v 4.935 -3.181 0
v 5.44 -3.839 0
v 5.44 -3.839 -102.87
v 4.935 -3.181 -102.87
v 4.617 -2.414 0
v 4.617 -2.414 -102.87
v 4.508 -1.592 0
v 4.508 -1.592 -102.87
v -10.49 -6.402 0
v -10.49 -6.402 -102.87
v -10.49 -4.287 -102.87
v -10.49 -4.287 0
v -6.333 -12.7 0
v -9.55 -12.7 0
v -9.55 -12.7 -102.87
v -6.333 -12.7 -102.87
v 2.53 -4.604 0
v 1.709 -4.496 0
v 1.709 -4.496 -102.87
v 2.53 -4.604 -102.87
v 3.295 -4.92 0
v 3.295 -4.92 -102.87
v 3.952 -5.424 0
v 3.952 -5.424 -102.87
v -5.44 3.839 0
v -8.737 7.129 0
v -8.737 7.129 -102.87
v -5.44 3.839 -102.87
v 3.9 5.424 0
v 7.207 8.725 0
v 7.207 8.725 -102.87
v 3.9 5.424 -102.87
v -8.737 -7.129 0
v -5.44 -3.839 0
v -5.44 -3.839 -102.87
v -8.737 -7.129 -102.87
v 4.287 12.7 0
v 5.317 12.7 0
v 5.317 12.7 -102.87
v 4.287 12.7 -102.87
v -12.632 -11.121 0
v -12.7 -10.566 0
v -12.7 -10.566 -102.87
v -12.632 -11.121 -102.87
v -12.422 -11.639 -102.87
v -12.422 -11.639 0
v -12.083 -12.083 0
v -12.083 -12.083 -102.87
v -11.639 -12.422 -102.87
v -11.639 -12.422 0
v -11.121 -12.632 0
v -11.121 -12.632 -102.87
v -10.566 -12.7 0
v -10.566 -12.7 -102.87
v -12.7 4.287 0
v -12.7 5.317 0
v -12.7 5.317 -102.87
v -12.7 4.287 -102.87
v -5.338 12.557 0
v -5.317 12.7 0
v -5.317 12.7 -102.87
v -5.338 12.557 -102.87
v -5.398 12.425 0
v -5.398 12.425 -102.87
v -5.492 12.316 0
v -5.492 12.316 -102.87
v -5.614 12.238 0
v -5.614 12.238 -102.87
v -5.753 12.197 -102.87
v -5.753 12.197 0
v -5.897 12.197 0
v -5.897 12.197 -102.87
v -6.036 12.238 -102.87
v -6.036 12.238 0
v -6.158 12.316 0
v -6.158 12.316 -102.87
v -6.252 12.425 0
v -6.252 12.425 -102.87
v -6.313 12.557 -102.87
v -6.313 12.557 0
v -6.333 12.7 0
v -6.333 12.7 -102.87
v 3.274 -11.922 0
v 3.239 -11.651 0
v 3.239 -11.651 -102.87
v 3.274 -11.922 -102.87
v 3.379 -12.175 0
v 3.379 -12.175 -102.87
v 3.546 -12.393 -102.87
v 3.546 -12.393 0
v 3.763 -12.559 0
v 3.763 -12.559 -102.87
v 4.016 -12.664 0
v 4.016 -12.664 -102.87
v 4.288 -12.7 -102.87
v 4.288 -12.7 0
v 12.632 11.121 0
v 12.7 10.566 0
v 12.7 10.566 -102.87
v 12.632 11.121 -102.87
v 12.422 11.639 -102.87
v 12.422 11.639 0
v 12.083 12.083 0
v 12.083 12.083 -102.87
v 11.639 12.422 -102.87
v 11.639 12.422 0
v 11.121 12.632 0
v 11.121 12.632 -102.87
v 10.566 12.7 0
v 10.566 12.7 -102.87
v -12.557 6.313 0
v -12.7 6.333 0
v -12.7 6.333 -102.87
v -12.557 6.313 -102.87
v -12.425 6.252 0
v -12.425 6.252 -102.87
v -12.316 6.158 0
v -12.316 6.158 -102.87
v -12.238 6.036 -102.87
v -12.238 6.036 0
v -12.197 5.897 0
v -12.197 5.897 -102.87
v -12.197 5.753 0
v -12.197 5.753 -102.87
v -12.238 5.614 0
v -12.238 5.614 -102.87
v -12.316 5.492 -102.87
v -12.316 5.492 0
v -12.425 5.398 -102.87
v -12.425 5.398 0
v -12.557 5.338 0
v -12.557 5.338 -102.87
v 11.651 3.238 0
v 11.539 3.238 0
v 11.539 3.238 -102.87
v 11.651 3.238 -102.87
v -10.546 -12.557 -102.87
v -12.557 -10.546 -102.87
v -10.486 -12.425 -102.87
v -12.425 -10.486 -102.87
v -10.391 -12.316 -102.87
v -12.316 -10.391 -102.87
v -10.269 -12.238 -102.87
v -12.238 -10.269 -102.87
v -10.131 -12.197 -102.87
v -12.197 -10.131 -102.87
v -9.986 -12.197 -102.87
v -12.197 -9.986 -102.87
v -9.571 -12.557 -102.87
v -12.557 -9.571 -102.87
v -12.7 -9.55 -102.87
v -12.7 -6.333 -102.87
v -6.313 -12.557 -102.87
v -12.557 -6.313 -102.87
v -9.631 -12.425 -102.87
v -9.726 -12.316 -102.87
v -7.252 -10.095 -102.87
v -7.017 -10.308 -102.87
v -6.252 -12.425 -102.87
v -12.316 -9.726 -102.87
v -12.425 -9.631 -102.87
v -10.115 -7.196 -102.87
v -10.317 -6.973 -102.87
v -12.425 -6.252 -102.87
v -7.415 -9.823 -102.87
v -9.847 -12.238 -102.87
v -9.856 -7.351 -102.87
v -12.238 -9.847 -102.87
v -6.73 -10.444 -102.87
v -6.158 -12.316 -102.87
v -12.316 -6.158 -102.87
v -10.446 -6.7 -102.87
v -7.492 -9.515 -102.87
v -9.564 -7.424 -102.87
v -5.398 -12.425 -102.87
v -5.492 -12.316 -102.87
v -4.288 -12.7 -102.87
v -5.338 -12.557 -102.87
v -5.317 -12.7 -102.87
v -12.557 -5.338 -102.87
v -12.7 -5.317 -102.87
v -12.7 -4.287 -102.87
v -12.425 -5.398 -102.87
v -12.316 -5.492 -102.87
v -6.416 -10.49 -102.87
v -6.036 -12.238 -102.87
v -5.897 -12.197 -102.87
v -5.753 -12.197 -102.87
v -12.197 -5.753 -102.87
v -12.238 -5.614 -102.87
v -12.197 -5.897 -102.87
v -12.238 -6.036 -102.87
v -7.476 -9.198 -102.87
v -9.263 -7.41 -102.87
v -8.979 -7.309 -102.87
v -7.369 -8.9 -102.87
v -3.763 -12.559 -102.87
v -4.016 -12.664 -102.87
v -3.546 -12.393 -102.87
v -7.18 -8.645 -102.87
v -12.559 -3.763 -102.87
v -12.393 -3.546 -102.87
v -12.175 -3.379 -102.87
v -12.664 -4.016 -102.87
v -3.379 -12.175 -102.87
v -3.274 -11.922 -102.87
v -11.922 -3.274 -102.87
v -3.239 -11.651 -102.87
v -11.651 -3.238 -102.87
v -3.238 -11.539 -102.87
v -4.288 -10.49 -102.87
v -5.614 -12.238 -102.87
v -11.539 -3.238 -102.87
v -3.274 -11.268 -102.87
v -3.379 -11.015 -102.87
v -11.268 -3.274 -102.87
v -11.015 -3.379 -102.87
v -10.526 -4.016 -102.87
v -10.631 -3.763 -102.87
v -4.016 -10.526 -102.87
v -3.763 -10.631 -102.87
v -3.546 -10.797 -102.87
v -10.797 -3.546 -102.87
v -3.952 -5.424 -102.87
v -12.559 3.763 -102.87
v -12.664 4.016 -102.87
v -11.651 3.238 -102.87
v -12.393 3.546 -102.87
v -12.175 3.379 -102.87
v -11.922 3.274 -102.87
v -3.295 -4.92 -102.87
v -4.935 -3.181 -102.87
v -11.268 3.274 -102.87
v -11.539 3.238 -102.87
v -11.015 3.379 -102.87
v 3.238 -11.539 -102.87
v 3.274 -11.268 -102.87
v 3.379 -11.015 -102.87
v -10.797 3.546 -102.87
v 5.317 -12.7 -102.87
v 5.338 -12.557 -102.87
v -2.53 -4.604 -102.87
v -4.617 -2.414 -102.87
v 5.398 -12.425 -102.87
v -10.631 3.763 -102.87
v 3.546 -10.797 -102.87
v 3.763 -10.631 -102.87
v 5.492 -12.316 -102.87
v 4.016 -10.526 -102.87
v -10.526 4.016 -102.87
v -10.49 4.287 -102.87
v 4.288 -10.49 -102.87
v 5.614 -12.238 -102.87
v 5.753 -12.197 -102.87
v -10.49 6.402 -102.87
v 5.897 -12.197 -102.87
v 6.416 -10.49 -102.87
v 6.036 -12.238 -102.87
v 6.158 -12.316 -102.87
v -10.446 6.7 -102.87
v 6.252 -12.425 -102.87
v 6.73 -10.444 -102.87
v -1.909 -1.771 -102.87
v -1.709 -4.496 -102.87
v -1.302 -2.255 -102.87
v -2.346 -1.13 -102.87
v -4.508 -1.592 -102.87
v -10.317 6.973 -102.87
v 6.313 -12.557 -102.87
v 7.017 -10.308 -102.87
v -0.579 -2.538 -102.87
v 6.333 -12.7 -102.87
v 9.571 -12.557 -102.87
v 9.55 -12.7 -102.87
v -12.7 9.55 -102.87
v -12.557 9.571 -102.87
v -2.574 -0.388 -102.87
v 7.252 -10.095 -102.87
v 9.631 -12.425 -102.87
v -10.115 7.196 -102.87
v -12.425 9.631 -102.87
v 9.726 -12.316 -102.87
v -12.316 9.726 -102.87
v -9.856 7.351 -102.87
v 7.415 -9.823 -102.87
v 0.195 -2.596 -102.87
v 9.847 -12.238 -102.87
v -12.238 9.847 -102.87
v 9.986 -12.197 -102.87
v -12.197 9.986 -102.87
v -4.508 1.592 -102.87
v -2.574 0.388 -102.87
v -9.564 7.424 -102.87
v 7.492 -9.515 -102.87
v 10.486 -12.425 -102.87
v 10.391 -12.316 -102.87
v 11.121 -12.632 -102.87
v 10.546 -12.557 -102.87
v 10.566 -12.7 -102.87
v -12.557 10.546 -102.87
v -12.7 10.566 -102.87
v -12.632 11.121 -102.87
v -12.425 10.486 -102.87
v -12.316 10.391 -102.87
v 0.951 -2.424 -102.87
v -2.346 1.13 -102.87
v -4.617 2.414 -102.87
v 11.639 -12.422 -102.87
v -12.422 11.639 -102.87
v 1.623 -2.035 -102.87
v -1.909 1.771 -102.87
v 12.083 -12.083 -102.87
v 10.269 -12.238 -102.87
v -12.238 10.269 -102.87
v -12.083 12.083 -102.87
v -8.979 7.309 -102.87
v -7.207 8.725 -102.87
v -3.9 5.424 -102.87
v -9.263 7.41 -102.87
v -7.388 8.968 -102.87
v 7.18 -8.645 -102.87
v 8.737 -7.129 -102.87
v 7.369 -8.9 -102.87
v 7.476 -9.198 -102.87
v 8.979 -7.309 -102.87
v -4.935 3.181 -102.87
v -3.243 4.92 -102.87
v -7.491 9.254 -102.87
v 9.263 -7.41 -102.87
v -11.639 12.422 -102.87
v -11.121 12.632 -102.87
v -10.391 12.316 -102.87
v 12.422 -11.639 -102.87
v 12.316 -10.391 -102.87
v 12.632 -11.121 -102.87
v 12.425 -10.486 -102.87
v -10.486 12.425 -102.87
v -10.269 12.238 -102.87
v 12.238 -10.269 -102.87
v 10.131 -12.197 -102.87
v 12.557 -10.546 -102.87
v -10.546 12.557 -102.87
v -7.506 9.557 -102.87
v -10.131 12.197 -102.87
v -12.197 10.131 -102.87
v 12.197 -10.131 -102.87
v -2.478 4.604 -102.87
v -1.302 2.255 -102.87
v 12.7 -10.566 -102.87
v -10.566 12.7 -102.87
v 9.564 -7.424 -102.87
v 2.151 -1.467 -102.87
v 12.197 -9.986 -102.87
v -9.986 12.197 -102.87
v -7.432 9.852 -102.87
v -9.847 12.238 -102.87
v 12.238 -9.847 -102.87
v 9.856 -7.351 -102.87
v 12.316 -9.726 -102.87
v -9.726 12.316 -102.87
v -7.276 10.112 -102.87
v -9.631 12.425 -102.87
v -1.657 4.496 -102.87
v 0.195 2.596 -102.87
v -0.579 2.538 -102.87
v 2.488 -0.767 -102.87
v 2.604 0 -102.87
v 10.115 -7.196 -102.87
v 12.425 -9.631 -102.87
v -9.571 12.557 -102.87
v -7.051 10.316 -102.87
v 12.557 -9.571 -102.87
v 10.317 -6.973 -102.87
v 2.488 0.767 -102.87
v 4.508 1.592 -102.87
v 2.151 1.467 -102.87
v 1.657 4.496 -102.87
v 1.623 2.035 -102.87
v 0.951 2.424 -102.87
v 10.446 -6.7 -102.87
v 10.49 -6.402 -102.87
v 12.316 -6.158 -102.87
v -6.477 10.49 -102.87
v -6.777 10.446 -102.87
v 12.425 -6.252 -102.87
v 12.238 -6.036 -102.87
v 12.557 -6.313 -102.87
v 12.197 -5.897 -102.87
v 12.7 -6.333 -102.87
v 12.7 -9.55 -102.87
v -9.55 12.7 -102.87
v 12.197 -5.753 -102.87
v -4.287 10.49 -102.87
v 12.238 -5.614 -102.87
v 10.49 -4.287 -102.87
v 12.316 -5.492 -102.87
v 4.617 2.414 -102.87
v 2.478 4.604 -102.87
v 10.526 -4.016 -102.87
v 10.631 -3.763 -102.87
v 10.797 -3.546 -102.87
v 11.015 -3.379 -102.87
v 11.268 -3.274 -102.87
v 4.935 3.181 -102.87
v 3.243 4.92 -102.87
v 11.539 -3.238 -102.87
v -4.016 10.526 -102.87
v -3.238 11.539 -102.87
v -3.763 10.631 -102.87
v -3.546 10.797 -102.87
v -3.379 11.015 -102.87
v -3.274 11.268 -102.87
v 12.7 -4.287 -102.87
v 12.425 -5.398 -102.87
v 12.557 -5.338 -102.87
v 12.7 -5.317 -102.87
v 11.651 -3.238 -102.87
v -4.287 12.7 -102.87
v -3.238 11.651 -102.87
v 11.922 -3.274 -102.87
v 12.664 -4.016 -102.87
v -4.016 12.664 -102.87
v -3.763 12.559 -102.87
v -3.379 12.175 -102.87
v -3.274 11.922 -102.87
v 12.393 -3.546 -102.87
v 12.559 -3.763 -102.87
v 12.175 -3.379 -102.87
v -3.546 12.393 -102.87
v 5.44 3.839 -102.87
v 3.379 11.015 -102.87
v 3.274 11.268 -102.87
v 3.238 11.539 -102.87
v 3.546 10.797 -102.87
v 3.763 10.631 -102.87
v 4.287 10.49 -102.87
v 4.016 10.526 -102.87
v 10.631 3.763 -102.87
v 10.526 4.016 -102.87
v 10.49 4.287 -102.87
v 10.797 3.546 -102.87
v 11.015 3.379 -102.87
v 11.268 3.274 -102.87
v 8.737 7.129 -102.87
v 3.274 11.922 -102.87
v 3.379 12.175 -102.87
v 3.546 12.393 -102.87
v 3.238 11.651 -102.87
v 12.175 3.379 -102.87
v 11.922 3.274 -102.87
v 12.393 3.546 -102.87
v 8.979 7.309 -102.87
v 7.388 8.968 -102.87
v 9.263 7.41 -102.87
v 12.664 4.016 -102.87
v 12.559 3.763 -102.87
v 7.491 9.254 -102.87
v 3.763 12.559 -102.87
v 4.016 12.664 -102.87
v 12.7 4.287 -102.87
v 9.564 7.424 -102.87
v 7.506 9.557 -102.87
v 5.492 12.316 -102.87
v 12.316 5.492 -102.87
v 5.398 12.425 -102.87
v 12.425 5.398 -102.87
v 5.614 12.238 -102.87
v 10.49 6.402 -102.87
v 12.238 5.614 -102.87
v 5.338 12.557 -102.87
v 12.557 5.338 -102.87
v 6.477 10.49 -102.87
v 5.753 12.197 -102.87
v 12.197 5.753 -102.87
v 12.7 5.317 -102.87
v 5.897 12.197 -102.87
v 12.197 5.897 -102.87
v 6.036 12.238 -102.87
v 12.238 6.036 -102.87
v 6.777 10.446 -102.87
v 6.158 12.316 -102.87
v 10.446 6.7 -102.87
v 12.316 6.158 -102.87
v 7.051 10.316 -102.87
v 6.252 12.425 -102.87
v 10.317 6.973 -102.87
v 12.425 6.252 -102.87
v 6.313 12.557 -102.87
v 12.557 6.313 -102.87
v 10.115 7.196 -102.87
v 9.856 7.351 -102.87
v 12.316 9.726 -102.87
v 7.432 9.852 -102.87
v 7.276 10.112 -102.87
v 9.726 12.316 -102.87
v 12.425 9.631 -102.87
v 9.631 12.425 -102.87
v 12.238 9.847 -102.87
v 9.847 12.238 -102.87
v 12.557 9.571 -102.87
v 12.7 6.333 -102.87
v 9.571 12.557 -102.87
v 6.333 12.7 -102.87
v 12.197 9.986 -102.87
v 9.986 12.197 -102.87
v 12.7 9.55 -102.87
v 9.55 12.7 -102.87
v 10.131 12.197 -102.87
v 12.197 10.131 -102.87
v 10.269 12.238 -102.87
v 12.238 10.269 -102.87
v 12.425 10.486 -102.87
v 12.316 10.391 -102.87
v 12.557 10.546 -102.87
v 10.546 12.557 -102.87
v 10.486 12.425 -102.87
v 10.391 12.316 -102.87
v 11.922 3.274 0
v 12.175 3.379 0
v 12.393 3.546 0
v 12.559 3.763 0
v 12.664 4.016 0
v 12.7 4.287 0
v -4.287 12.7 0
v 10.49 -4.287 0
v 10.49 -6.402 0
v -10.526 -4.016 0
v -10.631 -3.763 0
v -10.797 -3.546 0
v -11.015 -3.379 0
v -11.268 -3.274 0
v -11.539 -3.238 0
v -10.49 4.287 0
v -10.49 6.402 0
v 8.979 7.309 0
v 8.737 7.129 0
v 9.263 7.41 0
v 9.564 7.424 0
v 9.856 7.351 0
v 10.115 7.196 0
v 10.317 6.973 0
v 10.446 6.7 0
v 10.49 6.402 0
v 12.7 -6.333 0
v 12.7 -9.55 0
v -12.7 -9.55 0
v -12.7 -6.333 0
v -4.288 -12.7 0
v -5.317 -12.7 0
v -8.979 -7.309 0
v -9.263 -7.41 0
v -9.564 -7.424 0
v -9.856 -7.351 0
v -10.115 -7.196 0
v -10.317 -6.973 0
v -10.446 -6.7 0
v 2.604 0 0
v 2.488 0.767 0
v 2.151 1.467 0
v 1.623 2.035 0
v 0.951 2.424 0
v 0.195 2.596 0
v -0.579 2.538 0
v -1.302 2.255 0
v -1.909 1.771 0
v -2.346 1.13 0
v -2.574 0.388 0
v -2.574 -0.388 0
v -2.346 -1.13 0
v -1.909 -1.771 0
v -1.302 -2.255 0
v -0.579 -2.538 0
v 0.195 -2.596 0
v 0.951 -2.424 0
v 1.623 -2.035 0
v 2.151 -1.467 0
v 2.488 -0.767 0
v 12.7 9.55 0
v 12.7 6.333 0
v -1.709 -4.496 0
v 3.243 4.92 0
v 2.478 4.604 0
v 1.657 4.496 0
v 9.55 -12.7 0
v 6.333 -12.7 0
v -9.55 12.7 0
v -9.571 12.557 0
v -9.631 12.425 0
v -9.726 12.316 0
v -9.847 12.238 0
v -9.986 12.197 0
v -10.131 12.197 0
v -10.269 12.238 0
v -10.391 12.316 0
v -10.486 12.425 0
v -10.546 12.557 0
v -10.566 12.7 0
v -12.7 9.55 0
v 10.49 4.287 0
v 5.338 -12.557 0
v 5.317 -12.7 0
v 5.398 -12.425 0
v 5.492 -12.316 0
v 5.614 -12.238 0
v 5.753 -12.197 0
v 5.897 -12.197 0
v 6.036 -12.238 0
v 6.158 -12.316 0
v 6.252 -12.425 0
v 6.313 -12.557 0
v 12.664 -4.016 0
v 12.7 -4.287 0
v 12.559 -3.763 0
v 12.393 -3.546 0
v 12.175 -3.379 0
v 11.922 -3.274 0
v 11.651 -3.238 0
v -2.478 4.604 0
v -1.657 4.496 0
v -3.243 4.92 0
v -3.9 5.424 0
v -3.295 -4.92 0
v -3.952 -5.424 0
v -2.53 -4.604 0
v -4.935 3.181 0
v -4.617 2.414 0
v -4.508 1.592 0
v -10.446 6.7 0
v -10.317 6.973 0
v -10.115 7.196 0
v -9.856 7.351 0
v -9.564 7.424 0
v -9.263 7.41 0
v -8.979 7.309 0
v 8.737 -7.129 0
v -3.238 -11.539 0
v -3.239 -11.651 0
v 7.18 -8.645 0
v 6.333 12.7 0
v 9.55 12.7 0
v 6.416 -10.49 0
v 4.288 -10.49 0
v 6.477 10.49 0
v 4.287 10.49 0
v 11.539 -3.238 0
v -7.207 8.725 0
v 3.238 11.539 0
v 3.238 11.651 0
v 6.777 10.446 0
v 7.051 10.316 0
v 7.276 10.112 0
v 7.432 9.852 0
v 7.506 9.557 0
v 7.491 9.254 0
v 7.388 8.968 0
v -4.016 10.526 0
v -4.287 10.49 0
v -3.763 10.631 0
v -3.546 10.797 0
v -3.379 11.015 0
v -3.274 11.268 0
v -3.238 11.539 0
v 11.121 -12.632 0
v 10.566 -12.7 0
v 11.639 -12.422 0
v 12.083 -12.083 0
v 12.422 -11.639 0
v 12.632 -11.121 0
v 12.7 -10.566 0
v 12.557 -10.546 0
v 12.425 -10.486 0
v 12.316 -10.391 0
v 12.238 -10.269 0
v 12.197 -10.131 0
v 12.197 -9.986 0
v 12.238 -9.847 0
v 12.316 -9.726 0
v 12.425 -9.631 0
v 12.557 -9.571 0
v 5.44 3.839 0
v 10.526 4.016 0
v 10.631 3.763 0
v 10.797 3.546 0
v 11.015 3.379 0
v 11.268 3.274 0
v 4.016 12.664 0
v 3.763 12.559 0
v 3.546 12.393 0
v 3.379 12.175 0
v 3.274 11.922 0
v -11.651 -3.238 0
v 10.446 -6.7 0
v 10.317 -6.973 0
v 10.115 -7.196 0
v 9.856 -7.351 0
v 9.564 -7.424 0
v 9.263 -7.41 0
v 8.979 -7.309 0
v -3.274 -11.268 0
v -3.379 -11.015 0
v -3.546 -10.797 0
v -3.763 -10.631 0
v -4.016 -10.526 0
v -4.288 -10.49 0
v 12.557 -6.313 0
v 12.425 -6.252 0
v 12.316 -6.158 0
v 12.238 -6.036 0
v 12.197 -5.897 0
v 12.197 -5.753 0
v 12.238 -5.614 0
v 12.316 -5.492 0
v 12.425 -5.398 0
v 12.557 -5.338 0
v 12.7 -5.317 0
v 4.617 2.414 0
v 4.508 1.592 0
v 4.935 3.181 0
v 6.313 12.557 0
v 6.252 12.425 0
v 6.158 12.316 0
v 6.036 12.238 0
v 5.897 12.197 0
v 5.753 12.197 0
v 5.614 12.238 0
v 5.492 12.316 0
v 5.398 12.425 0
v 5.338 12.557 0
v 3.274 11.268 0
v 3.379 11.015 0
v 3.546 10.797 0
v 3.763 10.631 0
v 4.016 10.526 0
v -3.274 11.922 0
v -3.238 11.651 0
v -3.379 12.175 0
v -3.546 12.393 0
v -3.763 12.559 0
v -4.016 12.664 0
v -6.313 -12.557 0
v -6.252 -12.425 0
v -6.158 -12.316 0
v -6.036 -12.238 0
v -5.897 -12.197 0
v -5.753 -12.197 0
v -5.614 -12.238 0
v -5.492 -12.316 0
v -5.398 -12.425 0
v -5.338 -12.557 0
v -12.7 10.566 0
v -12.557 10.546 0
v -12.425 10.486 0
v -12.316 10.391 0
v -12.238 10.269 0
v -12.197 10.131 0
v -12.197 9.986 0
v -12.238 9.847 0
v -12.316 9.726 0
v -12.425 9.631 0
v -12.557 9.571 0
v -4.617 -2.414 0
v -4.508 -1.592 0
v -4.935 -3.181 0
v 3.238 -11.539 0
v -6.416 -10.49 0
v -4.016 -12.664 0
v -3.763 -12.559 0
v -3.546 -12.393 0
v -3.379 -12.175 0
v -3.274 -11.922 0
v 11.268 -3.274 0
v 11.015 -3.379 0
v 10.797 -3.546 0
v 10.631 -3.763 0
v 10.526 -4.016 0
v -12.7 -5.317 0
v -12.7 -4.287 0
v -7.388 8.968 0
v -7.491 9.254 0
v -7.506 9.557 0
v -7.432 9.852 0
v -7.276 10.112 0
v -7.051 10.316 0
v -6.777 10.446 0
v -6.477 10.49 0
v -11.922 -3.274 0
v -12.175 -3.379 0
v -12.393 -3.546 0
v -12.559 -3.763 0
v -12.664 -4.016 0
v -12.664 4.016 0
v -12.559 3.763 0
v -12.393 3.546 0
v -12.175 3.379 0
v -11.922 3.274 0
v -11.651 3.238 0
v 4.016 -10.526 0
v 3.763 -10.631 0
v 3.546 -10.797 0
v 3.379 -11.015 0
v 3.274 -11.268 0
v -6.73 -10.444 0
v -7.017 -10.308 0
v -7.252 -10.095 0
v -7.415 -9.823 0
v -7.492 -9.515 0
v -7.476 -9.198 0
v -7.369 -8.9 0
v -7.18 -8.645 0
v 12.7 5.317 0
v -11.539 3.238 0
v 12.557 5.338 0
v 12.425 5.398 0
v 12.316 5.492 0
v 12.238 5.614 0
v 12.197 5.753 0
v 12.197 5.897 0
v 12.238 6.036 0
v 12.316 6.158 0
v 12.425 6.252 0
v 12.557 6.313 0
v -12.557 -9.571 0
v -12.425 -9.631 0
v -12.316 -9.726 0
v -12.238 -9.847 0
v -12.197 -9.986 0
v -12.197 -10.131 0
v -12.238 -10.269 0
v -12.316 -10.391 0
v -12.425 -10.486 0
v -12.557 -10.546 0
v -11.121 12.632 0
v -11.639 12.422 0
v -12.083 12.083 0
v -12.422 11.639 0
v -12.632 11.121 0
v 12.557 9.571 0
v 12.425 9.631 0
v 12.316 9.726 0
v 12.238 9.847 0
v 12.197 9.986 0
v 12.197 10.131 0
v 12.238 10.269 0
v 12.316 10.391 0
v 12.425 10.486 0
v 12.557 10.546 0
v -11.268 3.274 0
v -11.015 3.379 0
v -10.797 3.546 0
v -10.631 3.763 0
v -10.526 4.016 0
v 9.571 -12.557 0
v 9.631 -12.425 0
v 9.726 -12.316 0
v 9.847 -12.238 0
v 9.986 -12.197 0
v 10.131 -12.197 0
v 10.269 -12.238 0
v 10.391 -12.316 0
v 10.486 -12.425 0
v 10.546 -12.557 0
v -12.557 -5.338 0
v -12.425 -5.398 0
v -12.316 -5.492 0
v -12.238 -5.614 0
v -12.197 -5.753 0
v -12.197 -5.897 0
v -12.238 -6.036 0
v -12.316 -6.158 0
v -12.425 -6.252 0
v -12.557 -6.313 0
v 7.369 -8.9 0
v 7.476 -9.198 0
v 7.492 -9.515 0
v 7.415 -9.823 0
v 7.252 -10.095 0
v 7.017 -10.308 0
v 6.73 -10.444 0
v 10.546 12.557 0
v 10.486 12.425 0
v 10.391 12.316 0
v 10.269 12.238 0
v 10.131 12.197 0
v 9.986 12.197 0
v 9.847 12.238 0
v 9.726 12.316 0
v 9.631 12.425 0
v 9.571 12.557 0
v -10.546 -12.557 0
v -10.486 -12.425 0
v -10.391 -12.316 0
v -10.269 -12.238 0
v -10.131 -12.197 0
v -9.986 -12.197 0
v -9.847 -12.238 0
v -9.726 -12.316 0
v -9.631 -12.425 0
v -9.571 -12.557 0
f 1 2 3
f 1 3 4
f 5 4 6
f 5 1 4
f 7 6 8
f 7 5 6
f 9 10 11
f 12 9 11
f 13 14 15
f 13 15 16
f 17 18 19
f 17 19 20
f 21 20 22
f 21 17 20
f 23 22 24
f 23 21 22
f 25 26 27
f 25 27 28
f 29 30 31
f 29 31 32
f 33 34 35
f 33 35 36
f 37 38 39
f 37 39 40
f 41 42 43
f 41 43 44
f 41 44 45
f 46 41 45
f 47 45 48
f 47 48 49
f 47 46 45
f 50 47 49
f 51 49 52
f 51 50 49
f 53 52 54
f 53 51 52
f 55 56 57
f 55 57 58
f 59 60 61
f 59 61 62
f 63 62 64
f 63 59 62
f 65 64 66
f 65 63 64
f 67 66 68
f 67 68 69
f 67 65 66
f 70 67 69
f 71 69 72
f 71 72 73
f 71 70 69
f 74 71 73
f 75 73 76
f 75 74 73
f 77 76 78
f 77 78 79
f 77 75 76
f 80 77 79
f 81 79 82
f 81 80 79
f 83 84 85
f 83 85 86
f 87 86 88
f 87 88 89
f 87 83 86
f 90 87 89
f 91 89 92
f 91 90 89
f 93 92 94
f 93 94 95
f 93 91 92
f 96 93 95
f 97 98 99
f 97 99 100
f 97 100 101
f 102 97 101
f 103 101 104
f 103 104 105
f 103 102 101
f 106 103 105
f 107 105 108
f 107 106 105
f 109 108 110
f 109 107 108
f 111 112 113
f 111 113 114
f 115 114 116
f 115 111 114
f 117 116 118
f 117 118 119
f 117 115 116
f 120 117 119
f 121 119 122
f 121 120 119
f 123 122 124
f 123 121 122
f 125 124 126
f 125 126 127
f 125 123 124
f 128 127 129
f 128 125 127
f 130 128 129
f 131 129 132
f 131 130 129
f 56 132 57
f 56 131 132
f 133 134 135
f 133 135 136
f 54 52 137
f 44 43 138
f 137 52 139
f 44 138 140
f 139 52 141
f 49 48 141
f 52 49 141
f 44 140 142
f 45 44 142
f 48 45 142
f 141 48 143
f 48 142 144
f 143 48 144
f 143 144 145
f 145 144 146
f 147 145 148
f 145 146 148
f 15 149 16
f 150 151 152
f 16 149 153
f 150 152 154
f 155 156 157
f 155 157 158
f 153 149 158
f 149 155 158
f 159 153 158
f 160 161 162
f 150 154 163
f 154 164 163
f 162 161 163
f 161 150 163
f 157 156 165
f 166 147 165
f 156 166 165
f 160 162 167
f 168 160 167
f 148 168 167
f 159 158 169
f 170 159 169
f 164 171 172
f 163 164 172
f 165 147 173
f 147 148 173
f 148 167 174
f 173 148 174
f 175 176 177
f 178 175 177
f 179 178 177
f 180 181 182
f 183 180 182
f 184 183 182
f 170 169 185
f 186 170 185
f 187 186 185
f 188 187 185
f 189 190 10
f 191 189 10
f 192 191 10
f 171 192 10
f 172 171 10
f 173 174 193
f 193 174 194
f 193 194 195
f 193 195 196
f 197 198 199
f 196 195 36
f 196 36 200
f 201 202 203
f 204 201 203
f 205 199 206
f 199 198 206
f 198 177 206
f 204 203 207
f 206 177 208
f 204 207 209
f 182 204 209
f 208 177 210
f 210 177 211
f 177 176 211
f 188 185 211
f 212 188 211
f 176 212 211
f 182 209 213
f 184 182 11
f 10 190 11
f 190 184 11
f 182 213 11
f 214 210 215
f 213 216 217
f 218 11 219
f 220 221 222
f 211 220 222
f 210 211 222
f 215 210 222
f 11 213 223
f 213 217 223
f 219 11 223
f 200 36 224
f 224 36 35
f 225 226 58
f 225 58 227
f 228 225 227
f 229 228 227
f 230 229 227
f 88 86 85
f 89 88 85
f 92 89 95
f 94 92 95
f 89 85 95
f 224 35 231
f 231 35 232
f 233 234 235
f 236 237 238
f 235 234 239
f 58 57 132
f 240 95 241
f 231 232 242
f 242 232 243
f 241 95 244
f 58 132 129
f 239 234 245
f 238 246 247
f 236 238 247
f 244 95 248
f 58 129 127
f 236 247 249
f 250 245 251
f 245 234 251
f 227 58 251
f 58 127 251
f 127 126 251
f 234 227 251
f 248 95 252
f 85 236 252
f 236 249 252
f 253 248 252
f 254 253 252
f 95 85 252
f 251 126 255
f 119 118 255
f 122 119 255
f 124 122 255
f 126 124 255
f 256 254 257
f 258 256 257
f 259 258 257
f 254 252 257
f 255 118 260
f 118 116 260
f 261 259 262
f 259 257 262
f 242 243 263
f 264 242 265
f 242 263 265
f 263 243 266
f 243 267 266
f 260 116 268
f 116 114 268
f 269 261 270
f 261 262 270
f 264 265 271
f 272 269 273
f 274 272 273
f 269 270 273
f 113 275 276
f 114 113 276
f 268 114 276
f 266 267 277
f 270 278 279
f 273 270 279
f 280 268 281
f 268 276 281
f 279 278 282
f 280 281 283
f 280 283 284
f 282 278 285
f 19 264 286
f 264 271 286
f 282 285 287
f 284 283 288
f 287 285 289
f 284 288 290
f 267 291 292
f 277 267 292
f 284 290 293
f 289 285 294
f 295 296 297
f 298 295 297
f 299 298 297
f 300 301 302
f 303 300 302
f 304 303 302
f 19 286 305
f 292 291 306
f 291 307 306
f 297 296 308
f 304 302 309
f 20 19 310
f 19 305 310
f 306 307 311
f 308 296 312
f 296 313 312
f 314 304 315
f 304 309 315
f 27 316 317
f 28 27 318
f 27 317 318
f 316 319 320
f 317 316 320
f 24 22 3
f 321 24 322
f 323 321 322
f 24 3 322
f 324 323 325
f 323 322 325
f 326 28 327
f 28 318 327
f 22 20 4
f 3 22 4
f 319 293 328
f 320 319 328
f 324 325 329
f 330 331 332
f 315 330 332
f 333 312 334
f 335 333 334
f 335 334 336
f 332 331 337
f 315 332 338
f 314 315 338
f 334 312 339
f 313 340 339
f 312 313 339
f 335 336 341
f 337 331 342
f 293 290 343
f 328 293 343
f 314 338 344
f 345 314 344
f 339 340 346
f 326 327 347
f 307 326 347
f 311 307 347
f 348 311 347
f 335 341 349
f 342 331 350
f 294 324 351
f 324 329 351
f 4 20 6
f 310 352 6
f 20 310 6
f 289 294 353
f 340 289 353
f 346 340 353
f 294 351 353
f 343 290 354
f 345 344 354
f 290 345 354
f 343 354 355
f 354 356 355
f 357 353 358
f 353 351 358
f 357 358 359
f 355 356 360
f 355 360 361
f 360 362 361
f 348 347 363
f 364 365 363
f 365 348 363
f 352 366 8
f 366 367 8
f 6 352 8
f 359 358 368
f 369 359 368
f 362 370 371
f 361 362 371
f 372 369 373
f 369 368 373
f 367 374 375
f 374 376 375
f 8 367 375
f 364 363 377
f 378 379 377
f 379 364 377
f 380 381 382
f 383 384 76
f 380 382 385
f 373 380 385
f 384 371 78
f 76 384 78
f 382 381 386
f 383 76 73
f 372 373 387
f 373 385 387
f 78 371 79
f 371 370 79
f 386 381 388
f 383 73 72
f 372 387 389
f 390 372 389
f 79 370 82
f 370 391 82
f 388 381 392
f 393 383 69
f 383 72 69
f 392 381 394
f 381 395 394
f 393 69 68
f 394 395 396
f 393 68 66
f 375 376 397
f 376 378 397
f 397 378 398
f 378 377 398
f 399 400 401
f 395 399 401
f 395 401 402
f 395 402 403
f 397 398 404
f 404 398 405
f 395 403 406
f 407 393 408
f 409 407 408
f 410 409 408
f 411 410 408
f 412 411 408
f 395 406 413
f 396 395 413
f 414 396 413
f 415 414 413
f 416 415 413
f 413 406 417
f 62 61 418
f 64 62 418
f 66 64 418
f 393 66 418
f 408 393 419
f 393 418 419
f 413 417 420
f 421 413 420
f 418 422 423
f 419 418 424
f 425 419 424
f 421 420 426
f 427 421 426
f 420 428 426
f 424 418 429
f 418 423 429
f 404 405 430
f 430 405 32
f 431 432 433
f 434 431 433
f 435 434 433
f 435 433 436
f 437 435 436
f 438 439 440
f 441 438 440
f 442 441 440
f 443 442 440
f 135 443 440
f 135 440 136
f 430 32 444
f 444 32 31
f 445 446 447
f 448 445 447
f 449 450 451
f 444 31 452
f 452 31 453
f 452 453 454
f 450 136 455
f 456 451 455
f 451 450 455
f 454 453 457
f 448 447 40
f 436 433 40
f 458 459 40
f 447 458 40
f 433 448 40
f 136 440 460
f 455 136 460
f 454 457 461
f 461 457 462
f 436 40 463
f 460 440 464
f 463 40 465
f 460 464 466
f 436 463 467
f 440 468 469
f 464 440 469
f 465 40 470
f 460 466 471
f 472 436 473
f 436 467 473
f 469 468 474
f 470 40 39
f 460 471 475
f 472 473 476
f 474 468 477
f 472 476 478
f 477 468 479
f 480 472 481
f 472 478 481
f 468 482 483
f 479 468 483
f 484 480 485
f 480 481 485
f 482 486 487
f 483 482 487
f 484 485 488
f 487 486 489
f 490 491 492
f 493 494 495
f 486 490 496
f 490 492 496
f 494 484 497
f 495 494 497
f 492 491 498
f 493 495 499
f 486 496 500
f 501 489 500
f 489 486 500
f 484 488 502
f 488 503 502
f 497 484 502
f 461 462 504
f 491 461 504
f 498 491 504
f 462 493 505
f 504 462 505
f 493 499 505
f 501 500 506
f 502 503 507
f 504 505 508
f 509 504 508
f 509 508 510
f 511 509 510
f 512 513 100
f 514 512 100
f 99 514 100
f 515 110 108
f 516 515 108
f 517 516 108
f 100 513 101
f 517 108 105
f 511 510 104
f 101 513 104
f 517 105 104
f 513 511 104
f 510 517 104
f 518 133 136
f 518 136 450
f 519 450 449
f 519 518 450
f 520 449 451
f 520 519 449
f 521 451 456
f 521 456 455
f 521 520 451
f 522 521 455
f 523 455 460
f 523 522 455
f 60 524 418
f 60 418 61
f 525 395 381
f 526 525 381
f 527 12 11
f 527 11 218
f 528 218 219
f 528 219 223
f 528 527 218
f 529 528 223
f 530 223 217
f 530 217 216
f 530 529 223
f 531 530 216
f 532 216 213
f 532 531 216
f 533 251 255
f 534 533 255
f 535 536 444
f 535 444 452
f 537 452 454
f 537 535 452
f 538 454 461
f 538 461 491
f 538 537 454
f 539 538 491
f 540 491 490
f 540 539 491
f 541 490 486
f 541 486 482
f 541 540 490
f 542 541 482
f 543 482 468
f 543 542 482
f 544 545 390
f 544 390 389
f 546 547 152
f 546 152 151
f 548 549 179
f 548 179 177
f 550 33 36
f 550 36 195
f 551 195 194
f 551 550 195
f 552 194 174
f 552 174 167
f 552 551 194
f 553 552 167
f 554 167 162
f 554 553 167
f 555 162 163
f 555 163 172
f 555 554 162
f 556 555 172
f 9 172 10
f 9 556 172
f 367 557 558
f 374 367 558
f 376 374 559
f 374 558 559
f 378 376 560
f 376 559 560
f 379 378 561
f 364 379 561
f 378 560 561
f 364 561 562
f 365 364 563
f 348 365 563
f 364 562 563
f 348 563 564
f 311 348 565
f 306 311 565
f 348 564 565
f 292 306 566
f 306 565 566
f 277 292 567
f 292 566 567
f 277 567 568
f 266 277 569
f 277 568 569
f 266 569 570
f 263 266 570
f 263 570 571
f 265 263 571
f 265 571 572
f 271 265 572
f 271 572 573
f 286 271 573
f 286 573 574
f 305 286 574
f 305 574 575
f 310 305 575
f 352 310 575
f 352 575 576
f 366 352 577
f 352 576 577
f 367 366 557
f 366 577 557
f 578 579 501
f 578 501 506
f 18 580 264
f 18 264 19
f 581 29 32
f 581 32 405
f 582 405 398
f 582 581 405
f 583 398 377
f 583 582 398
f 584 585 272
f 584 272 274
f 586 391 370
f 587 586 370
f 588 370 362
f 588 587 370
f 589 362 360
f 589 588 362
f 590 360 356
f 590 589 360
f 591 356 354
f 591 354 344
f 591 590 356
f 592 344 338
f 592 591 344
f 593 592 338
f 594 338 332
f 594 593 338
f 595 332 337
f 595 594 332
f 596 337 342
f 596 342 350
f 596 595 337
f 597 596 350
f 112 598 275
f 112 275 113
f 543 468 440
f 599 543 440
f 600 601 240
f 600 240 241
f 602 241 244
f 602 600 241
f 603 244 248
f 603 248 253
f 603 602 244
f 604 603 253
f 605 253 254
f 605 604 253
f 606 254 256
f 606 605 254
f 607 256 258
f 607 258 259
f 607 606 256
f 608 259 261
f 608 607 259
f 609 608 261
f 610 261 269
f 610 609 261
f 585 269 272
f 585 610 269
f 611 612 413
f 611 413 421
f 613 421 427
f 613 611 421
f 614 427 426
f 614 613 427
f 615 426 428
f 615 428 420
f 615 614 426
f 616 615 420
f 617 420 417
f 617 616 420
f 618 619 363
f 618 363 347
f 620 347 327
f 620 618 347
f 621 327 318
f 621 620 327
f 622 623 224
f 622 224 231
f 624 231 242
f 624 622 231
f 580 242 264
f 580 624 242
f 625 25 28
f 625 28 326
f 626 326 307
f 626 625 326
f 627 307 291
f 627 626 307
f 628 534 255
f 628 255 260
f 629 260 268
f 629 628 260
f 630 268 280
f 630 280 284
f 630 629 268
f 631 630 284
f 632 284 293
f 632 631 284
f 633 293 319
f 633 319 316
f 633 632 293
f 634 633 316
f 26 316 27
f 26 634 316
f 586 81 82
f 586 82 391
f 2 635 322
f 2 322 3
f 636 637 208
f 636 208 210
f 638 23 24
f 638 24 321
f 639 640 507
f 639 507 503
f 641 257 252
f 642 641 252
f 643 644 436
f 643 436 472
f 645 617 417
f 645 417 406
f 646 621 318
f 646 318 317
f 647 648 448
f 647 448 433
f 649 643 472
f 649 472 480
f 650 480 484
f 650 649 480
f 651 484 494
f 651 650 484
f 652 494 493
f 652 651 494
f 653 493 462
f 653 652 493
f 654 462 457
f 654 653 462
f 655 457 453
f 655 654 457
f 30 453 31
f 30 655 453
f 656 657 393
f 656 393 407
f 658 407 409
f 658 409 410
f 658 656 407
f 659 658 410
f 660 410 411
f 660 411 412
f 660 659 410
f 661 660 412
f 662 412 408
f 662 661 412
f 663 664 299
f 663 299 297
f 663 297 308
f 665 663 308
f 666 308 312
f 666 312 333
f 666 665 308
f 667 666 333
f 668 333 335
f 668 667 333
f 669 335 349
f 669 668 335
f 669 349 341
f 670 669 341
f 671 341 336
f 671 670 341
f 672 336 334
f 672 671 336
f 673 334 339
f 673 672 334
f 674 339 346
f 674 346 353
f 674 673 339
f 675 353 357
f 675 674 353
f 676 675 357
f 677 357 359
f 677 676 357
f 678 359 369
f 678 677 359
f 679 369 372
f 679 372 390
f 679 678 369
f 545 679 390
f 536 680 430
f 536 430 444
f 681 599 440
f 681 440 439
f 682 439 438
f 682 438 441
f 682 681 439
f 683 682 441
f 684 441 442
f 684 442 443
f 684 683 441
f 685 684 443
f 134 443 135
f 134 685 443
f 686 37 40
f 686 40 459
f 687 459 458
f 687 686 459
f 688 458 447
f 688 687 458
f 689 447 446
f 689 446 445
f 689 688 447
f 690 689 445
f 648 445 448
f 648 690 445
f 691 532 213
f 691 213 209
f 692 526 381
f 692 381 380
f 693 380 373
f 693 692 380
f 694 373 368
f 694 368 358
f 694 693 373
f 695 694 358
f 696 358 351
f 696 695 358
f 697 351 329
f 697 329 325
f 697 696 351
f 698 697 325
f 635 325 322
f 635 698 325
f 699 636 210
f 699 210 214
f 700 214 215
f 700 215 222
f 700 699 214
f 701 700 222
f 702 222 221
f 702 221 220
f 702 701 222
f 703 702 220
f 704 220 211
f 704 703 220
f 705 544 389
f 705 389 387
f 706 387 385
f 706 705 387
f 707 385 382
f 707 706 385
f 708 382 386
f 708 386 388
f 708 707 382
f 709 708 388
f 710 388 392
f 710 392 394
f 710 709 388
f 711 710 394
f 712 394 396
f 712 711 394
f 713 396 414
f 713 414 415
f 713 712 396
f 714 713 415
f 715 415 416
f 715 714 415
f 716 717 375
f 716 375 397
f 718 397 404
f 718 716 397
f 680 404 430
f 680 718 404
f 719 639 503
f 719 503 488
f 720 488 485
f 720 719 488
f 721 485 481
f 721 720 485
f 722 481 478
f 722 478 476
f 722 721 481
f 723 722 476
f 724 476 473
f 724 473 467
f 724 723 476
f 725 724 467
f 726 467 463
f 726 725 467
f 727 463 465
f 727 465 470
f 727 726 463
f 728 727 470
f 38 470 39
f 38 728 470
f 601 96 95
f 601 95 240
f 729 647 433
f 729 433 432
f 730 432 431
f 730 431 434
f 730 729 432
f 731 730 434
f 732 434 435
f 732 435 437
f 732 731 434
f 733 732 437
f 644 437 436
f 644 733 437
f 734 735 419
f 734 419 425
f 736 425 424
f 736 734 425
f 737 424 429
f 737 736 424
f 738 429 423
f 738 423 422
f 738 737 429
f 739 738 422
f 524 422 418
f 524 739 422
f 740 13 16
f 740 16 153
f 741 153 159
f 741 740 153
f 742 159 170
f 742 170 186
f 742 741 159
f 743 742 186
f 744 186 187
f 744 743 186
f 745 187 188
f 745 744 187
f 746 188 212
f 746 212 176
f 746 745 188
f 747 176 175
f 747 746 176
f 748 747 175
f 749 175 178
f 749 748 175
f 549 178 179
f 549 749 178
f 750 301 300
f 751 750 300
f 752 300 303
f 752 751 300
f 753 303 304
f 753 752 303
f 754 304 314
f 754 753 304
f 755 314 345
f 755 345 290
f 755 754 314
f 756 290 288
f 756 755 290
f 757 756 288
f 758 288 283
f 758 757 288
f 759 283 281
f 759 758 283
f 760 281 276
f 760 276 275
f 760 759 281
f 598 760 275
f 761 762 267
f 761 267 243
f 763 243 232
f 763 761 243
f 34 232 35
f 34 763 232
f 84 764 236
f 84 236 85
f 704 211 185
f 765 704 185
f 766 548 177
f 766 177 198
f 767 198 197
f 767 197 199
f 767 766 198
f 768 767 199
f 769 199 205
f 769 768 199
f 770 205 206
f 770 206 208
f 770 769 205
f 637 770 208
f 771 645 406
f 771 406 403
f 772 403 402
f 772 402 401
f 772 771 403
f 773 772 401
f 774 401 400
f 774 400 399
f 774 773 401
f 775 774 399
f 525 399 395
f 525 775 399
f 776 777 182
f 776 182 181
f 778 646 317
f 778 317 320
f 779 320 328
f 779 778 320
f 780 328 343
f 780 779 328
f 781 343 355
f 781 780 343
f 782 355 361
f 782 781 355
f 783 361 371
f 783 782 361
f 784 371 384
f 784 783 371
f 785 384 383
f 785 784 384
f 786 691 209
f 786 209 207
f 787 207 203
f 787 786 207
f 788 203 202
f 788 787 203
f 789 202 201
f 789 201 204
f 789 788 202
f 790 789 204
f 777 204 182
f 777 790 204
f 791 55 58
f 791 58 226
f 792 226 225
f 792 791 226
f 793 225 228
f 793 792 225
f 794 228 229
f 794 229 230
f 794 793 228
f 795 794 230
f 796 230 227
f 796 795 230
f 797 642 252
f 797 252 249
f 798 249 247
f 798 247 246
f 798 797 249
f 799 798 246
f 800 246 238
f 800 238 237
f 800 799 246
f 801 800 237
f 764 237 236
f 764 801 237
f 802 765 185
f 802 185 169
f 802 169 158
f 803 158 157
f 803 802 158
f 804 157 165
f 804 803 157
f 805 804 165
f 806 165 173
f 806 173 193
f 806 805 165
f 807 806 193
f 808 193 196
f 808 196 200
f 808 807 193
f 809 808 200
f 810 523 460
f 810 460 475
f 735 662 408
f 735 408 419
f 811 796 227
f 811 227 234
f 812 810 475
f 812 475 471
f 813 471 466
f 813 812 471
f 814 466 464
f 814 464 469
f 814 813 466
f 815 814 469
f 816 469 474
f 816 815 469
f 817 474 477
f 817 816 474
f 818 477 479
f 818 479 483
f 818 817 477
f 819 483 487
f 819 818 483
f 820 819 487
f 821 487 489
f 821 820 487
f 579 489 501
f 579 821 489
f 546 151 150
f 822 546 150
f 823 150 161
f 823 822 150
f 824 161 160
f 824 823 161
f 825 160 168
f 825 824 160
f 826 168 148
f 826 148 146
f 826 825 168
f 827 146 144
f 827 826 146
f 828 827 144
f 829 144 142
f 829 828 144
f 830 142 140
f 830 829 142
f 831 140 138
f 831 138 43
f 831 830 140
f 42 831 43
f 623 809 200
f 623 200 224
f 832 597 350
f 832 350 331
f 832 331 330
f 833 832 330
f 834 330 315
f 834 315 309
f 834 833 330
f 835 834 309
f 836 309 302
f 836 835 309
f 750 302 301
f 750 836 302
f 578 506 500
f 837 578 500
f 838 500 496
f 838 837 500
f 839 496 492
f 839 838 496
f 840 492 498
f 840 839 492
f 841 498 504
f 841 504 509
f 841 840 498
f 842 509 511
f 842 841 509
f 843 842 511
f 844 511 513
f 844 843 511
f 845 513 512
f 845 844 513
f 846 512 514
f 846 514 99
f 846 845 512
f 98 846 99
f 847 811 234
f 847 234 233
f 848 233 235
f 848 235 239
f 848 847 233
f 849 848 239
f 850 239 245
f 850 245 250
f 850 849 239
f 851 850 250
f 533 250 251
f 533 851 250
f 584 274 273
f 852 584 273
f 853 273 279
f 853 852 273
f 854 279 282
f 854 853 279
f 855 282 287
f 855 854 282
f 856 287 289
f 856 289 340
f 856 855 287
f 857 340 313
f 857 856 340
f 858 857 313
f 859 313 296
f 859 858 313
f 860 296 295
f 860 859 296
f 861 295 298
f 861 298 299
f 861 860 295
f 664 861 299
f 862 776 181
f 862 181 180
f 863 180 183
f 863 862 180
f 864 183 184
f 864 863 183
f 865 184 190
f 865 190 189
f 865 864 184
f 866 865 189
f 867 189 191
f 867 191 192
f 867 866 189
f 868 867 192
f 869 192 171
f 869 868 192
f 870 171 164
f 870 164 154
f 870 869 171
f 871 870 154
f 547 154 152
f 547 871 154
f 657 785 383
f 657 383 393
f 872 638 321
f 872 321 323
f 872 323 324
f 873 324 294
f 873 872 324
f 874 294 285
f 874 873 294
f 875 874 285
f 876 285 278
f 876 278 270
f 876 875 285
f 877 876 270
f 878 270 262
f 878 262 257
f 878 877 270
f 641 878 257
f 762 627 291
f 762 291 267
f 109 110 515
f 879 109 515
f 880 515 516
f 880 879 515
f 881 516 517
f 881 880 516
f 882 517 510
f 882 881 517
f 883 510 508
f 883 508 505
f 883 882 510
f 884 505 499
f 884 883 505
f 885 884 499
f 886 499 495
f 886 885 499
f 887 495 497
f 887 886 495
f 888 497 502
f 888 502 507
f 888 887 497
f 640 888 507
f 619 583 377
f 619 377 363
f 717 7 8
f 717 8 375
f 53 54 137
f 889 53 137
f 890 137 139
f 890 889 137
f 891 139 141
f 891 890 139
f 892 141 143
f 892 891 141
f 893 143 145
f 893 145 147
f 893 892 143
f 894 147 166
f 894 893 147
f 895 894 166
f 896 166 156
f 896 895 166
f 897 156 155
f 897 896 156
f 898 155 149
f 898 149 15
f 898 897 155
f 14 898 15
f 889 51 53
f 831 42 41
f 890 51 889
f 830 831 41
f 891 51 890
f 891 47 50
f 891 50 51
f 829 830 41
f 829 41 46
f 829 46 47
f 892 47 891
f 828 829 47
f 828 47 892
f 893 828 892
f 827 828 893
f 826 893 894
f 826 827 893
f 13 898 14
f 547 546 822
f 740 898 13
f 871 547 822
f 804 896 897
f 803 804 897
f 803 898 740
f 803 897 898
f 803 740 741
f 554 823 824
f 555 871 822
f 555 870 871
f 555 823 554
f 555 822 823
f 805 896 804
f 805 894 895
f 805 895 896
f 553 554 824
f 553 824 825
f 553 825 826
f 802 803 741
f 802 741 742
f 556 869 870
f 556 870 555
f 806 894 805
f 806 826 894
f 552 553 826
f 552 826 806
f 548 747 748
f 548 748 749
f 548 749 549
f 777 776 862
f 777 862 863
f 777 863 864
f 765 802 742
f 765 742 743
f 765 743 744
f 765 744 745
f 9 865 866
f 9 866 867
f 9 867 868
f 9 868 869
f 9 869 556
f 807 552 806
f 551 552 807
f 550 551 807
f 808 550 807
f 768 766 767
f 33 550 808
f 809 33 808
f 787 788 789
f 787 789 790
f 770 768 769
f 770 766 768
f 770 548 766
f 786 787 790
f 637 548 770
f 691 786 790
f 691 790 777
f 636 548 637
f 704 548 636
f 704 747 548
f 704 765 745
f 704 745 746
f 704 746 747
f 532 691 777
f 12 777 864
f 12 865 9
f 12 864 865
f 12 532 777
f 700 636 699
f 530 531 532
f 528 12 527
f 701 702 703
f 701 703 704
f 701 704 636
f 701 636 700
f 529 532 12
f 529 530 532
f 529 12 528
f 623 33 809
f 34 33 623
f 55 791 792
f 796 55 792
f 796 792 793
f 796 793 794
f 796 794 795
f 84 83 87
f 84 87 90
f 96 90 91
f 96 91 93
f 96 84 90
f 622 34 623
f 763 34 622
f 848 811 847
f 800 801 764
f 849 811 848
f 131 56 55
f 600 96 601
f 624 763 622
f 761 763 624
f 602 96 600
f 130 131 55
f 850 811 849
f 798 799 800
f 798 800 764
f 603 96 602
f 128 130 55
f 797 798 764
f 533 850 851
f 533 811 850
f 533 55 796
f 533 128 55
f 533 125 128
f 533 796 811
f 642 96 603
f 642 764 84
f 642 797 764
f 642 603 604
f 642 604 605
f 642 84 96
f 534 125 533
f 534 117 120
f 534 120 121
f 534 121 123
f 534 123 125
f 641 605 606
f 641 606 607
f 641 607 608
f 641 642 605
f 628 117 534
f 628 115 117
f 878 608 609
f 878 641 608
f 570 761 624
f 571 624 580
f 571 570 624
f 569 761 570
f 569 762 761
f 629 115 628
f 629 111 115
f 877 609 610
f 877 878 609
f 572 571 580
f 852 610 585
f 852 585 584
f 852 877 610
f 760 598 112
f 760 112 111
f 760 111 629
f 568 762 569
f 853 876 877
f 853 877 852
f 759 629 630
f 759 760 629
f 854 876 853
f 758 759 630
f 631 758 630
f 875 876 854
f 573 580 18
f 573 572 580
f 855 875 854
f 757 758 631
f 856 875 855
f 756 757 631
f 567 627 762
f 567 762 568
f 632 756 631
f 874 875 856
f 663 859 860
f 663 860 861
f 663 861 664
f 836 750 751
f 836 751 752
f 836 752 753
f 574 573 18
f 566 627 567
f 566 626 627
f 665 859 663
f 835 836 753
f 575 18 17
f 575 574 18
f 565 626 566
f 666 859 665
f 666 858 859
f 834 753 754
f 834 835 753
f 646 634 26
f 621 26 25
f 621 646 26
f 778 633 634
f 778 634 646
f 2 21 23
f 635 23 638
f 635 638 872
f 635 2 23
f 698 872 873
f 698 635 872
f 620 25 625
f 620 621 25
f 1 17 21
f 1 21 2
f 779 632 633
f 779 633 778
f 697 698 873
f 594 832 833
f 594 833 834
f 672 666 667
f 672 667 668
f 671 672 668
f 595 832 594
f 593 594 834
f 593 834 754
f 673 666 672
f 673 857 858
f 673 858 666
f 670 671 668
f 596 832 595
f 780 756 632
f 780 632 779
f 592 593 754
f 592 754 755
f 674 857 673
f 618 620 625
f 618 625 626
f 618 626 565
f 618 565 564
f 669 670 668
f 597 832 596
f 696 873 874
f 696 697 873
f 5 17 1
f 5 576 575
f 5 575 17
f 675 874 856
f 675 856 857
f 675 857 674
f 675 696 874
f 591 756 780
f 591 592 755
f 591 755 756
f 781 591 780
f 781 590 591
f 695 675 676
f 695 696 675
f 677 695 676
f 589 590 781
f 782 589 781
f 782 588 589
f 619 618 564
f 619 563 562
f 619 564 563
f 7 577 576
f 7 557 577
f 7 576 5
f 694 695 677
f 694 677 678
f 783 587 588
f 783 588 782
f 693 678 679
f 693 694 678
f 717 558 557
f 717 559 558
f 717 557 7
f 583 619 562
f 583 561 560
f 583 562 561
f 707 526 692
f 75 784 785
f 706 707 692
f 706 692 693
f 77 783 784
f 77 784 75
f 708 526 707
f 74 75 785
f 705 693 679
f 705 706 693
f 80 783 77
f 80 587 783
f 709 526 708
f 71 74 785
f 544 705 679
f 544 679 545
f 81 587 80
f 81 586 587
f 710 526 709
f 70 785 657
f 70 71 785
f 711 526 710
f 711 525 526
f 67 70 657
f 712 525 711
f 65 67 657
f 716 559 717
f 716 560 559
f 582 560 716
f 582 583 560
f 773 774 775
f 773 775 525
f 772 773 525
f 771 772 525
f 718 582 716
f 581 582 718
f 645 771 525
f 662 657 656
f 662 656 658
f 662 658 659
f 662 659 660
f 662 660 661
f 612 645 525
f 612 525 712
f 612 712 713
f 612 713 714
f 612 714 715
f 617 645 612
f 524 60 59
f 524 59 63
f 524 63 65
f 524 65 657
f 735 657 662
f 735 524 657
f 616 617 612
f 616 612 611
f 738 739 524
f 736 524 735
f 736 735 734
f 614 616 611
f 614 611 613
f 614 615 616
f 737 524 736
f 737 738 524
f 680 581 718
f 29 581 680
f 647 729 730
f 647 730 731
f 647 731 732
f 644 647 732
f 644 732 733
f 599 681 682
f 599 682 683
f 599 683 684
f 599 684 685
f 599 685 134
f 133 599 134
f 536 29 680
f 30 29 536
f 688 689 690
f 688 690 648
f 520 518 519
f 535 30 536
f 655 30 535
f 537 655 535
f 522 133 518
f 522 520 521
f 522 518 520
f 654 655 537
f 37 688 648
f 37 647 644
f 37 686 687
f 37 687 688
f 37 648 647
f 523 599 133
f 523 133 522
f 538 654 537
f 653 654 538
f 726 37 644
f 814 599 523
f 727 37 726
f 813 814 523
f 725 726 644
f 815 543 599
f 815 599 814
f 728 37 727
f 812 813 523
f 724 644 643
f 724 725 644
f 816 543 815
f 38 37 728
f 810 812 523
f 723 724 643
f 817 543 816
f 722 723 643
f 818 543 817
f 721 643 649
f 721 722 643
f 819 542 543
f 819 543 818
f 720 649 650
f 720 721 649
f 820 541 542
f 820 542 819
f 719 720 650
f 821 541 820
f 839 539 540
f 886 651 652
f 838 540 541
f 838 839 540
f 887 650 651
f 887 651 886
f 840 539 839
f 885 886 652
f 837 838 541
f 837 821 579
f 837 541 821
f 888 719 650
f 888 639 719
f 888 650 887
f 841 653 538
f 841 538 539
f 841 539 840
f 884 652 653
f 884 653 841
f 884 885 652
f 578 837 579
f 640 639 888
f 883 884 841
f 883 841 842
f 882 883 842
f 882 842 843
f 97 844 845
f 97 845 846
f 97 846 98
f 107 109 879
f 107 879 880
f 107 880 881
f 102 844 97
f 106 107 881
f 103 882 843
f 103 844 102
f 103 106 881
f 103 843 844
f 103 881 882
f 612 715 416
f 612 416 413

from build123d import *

# Parameters (mm, degrees)
SKETCH1_R      = 2.6035
EXTRUDE1_DEPTH = 102.87


with BuildPart() as part:
    # Sketch1 → Extrude1 (new body)
    with BuildSketch(Plane.XY):
        with BuildLine():
            Line((-1.709253557, -4.4958), (1.709253557, -4.4958))
            ThreePointArc((1.709253557, -4.4958), (2.922935876, -4.736928798), (3.95226937, -5.423689619))
            Line((3.95226937, -5.423689619), (7.179652728, -8.645192207))
            ThreePointArc((7.179652728, -8.645192207), (7.414733441, -9.822812921), (6.41641086, -10.4902))
            Line((6.41641086, -10.4902), (4.28752, -10.4902))
            ThreePointArc((4.28752, -10.4902), (3.545750844, -10.797450844), (3.2385, -11.53922))
            Line((3.2385, -11.53922), (3.2385, -11.65098))
            ThreePointArc((3.2385, -11.65098), (3.545750844, -12.392749156), (4.28752, -12.7))
            Line((4.28752, -12.7), (5.3171344, -12.7))
            ThreePointArc((5.3171344, -12.7), (5.8251344, -12.192), (6.3331344, -12.7))
            Line((6.3331344, -12.7), (9.5504, -12.7))
            ThreePointArc((9.5504, -12.7), (10.058323491, -12.192000006), (10.566399977, -12.699846982))
            ThreePointArc((10.566399977, -12.699846982), (12.082522516, -12.082522516), (12.699846982, -10.566399977))
            ThreePointArc((12.699846982, -10.566399977), (12.192000006, -10.058323491), (12.7, -9.5504))
            Line((12.7, -9.5504), (12.7, -6.3330836))
            ThreePointArc((12.7, -6.3330836), (12.192, -5.8250836), (12.7, -5.3170836))
            Line((12.7, -5.3170836), (12.7, -4.287470133))
            ThreePointArc((12.7, -4.287470133), (12.392749156, -3.545700977), (11.65098, -3.238450133))
            Line((11.65098, -3.238450133), (11.53922, -3.238450133))
            ThreePointArc((11.53922, -3.238450133), (10.797450844, -3.545700977), (10.4902, -4.287470133))
            Line((10.4902, -4.287470133), (10.4902, -6.402089023))
            ThreePointArc((10.4902, -6.402089023), (9.856394933, -7.351113629), (8.736962546, -7.129240479))
            Line((8.736962546, -7.129240479), (5.440484187, -3.838768792))
            ThreePointArc((5.440484187, -3.838768792), (4.75073678, -2.808015636), (4.5085, -1.591658411))
            Line((4.5085, -1.591658411), (4.5085, 1.591658411))
            ThreePointArc((4.5085, 1.591658411), (4.75073678, 2.808015636), (5.440484187, 3.838768792))
            Line((5.440484187, 3.838768792), (8.736962546, 7.129240479))
            ThreePointArc((8.736962546, 7.129240479), (9.856394933, 7.351113629), (10.4902, 6.402089023))
            Line((10.4902, 6.402089023), (10.4902, 4.287470133))
            ThreePointArc((10.4902, 4.287470133), (10.797450844, 3.545700977), (11.53922, 3.238450133))
            Line((11.53922, 3.238450133), (11.65098, 3.238450133))
            ThreePointArc((11.65098, 3.238450133), (12.392749156, 3.545700977), (12.7, 4.287470133))
            Line((12.7, 4.287470133), (12.7, 5.3171344))
            ThreePointArc((12.7, 5.3171344), (12.192, 5.8251344), (12.7, 6.3331344))
            Line((12.7, 6.3331344), (12.7, 9.5504))
            ThreePointArc((12.7, 9.5504), (12.192000006, 10.058323491), (12.699846982, 10.566399977))
            ThreePointArc((12.699846982, 10.566399977), (12.082522516, 12.082522516), (10.566399977, 12.699846982))
            ThreePointArc((10.566399977, 12.699846982), (10.058323491, 12.192000006), (9.5504, 12.7))
            Line((9.5504, 12.7), (6.3330836, 12.7))
            ThreePointArc((6.3330836, 12.7), (5.8250836, 12.192), (5.3170836, 12.7))
            Line((5.3170836, 12.7), (4.2874692, 12.7))
            ThreePointArc((4.2874692, 12.7), (3.545700044, 12.392749156), (3.2384492, 11.65098))
            Line((3.2384492, 11.65098), (3.2384492, 11.53922))
            ThreePointArc((3.2384492, 11.53922), (3.545700044, 10.797450844), (4.2874692, 10.4902))
            Line((4.2874692, 10.4902), (6.476774195, 10.4902))
            ThreePointArc((6.476774195, 10.4902), (7.43216212, 9.851515102), (7.207191475, 8.724540082))
            Line((7.207191475, 8.724540082), (3.900315394, 5.423689619))
            ThreePointArc((3.900315394, 5.423689619), (2.8709819, 4.736928798), (1.657299581, 4.4958))
            Line((1.657299581, 4.4958), (-1.657299581, 4.4958))
            ThreePointArc((-1.657299581, 4.4958), (-2.8709819, 4.736928798), (-3.900315394, 5.423689619))
            Line((-3.900315394, 5.423689619), (-7.207191475, 8.724540082))
            ThreePointArc((-7.207191475, 8.724540082), (-7.43216212, 9.851515102), (-6.476774195, 10.4902))
            Line((-6.476774195, 10.4902), (-4.2874692, 10.4902))
            ThreePointArc((-4.2874692, 10.4902), (-3.545700044, 10.797450844), (-3.2384492, 11.53922))
            Line((-3.2384492, 11.53922), (-3.2384492, 11.65098))
            ThreePointArc((-3.2384492, 11.65098), (-3.545700044, 12.392749156), (-4.2874692, 12.7))
            Line((-4.2874692, 12.7), (-5.3170836, 12.7))
            ThreePointArc((-5.3170836, 12.7), (-5.8250836, 12.192), (-6.3330836, 12.7))
            Line((-6.3330836, 12.7), (-9.5504, 12.7))
            ThreePointArc((-9.5504, 12.7), (-10.058323491, 12.192000006), (-10.566399977, 12.699846982))
            ThreePointArc((-10.566399977, 12.699846982), (-12.082522516, 12.082522516), (-12.699846982, 10.566399977))
            ThreePointArc((-12.699846982, 10.566399977), (-12.192000006, 10.058323491), (-12.7, 9.5504))
            Line((-12.7, 9.5504), (-12.7, 6.3331344))
            ThreePointArc((-12.7, 6.3331344), (-12.192, 5.8251344), (-12.7, 5.3171344))
            Line((-12.7, 5.3171344), (-12.7, 4.287470133))
            ThreePointArc((-12.7, 4.287470133), (-12.392749156, 3.545700977), (-11.65098, 3.238450133))
            Line((-11.65098, 3.238450133), (-11.53922, 3.238450133))
            ThreePointArc((-11.53922, 3.238450133), (-10.797450844, 3.545700977), (-10.4902, 4.287470133))
            Line((-10.4902, 4.287470133), (-10.4902, 6.402089023))
            ThreePointArc((-10.4902, 6.402089023), (-9.856394933, 7.351113629), (-8.736962546, 7.129240479))
            Line((-8.736962546, 7.129240479), (-5.440484187, 3.838768792))
            ThreePointArc((-5.440484187, 3.838768792), (-4.75073678, 2.808015636), (-4.5085, 1.591658411))
            Line((-4.5085, 1.591658411), (-4.5085, -1.591658411))
            ThreePointArc((-4.5085, -1.591658411), (-4.75073678, -2.808015636), (-5.440484187, -3.838768792))
            Line((-5.440484187, -3.838768792), (-8.736962546, -7.129240479))
            ThreePointArc((-8.736962546, -7.129240479), (-9.856394933, -7.351113629), (-10.4902, -6.402089023))
            Line((-10.4902, -6.402089023), (-10.4902, -4.287470133))
            ThreePointArc((-10.4902, -4.287470133), (-10.797450844, -3.545700977), (-11.53922, -3.238450133))
            Line((-11.53922, -3.238450133), (-11.65098, -3.238450133))
            ThreePointArc((-11.65098, -3.238450133), (-12.392749156, -3.545700977), (-12.7, -4.287470133))
            Line((-12.7, -4.287470133), (-12.7, -5.3170836))
            ThreePointArc((-12.7, -5.3170836), (-12.192, -5.8250836), (-12.7, -6.3330836))
            Line((-12.7, -6.3330836), (-12.7, -9.5504))
            ThreePointArc((-12.7, -9.5504), (-12.192000006, -10.058323491), (-12.699846982, -10.566399977))
            ThreePointArc((-12.699846982, -10.566399977), (-12.082522516, -12.082522516), (-10.566399977, -12.699846982))
            ThreePointArc((-10.566399977, -12.699846982), (-10.058323491, -12.192000006), (-9.5504, -12.7))
            Line((-9.5504, -12.7), (-6.3331344, -12.7))
            ThreePointArc((-6.3331344, -12.7), (-5.8251344, -12.192), (-5.3171344, -12.7))
            Line((-5.3171344, -12.7), (-4.28752, -12.7))
            ThreePointArc((-4.28752, -12.7), (-3.545750844, -12.392749156), (-3.2385, -11.65098))
            Line((-3.2385, -11.65098), (-3.2385, -11.53922))
            ThreePointArc((-3.2385, -11.53922), (-3.545750844, -10.797450844), (-4.28752, -10.4902))
            Line((-4.28752, -10.4902), (-6.41641086, -10.4902))
            ThreePointArc((-6.41641086, -10.4902), (-7.414733441, -9.822812921), (-7.179652728, -8.645192207))
            Line((-7.179652728, -8.645192207), (-3.95226937, -5.423689619))
            ThreePointArc((-3.95226937, -5.423689619), (-2.922935876, -4.736928798), (-1.709253557, -4.4958))
        make_face()
        Circle(SKETCH1_R, mode=Mode.SUBTRACT)
    extrude(amount=-EXTRUDE1_DEPTH)


solid = part.part
